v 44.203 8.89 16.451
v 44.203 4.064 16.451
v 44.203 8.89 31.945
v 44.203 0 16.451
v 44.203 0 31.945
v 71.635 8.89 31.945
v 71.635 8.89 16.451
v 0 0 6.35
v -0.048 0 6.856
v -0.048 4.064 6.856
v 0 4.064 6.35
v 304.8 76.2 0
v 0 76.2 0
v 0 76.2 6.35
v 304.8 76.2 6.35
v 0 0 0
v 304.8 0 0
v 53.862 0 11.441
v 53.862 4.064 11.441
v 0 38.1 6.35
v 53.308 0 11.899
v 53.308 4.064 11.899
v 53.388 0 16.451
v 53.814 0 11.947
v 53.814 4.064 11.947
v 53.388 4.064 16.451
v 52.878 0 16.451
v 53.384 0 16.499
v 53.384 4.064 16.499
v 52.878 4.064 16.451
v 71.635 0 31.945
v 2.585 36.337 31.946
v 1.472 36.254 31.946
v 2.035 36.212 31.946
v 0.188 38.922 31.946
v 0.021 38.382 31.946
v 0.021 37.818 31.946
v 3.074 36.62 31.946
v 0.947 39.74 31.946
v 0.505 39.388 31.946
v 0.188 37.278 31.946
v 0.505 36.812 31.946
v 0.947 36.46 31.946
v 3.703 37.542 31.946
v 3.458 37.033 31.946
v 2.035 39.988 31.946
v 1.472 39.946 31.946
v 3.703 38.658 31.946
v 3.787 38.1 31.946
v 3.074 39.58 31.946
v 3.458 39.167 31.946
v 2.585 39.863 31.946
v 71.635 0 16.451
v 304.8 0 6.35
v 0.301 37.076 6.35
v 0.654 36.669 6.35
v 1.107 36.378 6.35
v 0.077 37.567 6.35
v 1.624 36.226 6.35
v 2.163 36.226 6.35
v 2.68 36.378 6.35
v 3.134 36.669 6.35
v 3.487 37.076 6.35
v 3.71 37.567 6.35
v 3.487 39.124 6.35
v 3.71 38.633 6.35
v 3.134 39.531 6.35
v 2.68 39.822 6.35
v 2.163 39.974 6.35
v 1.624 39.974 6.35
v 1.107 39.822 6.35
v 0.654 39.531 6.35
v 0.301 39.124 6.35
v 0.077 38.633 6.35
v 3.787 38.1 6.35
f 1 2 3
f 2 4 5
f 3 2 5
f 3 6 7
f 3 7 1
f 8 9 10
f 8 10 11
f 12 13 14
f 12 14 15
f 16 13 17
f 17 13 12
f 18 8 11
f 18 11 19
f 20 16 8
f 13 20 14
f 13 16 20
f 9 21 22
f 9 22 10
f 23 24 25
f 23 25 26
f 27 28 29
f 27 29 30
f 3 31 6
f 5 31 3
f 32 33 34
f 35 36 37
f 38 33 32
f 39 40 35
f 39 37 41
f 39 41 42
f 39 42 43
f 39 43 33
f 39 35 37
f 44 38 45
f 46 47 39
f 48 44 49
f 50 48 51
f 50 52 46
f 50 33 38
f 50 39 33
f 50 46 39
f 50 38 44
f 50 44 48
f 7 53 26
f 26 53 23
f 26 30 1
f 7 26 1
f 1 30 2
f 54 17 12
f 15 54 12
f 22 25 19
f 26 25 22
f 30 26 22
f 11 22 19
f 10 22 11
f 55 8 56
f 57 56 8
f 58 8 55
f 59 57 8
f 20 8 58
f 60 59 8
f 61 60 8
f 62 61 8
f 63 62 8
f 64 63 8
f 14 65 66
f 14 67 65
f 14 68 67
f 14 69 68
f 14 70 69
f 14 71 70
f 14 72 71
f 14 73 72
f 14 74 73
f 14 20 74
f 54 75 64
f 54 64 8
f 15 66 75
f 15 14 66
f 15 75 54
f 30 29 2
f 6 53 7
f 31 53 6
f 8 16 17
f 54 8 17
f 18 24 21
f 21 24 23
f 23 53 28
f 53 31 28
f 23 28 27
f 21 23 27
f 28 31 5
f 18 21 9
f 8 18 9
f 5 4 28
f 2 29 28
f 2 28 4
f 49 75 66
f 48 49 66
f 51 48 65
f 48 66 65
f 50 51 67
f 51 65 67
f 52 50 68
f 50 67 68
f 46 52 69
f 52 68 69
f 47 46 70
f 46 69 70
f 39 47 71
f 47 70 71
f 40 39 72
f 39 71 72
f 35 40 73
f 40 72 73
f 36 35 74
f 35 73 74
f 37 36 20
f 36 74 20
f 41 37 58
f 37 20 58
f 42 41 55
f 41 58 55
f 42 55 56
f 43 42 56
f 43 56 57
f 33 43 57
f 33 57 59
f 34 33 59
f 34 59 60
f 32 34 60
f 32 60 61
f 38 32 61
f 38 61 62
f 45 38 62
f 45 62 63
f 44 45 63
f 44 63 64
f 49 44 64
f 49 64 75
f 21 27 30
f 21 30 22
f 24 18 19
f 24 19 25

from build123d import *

# Parameters (mm, degrees)
F0_W     = 304.8
F0_H     = 76.2
F1_DEPTH = 6.35
F3_DEPTH = 4.064
F5_DEPTH = 4.064
F6_W     = 27.432
F6_H     = 15.494
F7_DEPTH = 4.826
F9_DEPTH = 25.59558


with BuildPart() as f1:
    # F0 (on Top) → F1 (new body)
    with BuildSketch(Plane.XY):
        with Locations((152.4, 38.1)):
            Rectangle(F0_W, F0_H)
    extrude(amount=F1_DEPTH)

    # F8 (on face) → F9 (join)
    with BuildSketch(Plane.XY.offset(6.35)):
        with BuildLine():
            ThreePointArc((0, 38.1), (1.893576, 36.206424), (3.787152, 38.1))
            ThreePointArc((3.787152, 38.1), (1.893576, 39.993576), (0, 38.1))
        make_face()
    extrude(amount=F9_DEPTH)


with BuildPart() as f3:
    # F2 (on face) → F3 (new body)
    with BuildSketch(Plane.XZ):
        Polygon((-0.047807, 6.855745), (0, 6.35), (53.861893, 11.441448), (53.351629, 11.441448), (53.308341, 11.899386), align=None)
        Polygon((53.351629, 11.441448), (53.861893, 11.441448), (53.814086, 11.947193), (53.308341, 11.899386), align=None)
        Polygon((53.308341, 11.899386), (53.814086, 11.947193), (53.383823, 16.498903), (52.878078, 16.451096), align=None)
    extrude(amount=-F3_DEPTH)

    # F4 (on face) → F5 (join)
    with BuildSketch(Plane(origin=(0, 4.064, 0), x_dir=(-1, 0, 0), z_dir=(0, 1, 0))):
        Polygon((-71.635251, 16.451096), (-53.388342, 16.451096), (-53.383823, 16.498903), (-44.203251, 16.451096), (-44.203251, 31.945096), (-71.635251, 31.945096), align=None)
    extrude(amount=-F5_DEPTH)

    # F6 (on face) → F7 (join)
    with BuildSketch(Plane(origin=(0, 4.064, 0), x_dir=(-1, 0, 0), z_dir=(0, 1, 0))):
        with Locations((-57.919251, 24.198096)):
            Rectangle(F6_W, F6_H)
    extrude(amount=F7_DEPTH)


solid = Compound([f1.part, f3.part])
